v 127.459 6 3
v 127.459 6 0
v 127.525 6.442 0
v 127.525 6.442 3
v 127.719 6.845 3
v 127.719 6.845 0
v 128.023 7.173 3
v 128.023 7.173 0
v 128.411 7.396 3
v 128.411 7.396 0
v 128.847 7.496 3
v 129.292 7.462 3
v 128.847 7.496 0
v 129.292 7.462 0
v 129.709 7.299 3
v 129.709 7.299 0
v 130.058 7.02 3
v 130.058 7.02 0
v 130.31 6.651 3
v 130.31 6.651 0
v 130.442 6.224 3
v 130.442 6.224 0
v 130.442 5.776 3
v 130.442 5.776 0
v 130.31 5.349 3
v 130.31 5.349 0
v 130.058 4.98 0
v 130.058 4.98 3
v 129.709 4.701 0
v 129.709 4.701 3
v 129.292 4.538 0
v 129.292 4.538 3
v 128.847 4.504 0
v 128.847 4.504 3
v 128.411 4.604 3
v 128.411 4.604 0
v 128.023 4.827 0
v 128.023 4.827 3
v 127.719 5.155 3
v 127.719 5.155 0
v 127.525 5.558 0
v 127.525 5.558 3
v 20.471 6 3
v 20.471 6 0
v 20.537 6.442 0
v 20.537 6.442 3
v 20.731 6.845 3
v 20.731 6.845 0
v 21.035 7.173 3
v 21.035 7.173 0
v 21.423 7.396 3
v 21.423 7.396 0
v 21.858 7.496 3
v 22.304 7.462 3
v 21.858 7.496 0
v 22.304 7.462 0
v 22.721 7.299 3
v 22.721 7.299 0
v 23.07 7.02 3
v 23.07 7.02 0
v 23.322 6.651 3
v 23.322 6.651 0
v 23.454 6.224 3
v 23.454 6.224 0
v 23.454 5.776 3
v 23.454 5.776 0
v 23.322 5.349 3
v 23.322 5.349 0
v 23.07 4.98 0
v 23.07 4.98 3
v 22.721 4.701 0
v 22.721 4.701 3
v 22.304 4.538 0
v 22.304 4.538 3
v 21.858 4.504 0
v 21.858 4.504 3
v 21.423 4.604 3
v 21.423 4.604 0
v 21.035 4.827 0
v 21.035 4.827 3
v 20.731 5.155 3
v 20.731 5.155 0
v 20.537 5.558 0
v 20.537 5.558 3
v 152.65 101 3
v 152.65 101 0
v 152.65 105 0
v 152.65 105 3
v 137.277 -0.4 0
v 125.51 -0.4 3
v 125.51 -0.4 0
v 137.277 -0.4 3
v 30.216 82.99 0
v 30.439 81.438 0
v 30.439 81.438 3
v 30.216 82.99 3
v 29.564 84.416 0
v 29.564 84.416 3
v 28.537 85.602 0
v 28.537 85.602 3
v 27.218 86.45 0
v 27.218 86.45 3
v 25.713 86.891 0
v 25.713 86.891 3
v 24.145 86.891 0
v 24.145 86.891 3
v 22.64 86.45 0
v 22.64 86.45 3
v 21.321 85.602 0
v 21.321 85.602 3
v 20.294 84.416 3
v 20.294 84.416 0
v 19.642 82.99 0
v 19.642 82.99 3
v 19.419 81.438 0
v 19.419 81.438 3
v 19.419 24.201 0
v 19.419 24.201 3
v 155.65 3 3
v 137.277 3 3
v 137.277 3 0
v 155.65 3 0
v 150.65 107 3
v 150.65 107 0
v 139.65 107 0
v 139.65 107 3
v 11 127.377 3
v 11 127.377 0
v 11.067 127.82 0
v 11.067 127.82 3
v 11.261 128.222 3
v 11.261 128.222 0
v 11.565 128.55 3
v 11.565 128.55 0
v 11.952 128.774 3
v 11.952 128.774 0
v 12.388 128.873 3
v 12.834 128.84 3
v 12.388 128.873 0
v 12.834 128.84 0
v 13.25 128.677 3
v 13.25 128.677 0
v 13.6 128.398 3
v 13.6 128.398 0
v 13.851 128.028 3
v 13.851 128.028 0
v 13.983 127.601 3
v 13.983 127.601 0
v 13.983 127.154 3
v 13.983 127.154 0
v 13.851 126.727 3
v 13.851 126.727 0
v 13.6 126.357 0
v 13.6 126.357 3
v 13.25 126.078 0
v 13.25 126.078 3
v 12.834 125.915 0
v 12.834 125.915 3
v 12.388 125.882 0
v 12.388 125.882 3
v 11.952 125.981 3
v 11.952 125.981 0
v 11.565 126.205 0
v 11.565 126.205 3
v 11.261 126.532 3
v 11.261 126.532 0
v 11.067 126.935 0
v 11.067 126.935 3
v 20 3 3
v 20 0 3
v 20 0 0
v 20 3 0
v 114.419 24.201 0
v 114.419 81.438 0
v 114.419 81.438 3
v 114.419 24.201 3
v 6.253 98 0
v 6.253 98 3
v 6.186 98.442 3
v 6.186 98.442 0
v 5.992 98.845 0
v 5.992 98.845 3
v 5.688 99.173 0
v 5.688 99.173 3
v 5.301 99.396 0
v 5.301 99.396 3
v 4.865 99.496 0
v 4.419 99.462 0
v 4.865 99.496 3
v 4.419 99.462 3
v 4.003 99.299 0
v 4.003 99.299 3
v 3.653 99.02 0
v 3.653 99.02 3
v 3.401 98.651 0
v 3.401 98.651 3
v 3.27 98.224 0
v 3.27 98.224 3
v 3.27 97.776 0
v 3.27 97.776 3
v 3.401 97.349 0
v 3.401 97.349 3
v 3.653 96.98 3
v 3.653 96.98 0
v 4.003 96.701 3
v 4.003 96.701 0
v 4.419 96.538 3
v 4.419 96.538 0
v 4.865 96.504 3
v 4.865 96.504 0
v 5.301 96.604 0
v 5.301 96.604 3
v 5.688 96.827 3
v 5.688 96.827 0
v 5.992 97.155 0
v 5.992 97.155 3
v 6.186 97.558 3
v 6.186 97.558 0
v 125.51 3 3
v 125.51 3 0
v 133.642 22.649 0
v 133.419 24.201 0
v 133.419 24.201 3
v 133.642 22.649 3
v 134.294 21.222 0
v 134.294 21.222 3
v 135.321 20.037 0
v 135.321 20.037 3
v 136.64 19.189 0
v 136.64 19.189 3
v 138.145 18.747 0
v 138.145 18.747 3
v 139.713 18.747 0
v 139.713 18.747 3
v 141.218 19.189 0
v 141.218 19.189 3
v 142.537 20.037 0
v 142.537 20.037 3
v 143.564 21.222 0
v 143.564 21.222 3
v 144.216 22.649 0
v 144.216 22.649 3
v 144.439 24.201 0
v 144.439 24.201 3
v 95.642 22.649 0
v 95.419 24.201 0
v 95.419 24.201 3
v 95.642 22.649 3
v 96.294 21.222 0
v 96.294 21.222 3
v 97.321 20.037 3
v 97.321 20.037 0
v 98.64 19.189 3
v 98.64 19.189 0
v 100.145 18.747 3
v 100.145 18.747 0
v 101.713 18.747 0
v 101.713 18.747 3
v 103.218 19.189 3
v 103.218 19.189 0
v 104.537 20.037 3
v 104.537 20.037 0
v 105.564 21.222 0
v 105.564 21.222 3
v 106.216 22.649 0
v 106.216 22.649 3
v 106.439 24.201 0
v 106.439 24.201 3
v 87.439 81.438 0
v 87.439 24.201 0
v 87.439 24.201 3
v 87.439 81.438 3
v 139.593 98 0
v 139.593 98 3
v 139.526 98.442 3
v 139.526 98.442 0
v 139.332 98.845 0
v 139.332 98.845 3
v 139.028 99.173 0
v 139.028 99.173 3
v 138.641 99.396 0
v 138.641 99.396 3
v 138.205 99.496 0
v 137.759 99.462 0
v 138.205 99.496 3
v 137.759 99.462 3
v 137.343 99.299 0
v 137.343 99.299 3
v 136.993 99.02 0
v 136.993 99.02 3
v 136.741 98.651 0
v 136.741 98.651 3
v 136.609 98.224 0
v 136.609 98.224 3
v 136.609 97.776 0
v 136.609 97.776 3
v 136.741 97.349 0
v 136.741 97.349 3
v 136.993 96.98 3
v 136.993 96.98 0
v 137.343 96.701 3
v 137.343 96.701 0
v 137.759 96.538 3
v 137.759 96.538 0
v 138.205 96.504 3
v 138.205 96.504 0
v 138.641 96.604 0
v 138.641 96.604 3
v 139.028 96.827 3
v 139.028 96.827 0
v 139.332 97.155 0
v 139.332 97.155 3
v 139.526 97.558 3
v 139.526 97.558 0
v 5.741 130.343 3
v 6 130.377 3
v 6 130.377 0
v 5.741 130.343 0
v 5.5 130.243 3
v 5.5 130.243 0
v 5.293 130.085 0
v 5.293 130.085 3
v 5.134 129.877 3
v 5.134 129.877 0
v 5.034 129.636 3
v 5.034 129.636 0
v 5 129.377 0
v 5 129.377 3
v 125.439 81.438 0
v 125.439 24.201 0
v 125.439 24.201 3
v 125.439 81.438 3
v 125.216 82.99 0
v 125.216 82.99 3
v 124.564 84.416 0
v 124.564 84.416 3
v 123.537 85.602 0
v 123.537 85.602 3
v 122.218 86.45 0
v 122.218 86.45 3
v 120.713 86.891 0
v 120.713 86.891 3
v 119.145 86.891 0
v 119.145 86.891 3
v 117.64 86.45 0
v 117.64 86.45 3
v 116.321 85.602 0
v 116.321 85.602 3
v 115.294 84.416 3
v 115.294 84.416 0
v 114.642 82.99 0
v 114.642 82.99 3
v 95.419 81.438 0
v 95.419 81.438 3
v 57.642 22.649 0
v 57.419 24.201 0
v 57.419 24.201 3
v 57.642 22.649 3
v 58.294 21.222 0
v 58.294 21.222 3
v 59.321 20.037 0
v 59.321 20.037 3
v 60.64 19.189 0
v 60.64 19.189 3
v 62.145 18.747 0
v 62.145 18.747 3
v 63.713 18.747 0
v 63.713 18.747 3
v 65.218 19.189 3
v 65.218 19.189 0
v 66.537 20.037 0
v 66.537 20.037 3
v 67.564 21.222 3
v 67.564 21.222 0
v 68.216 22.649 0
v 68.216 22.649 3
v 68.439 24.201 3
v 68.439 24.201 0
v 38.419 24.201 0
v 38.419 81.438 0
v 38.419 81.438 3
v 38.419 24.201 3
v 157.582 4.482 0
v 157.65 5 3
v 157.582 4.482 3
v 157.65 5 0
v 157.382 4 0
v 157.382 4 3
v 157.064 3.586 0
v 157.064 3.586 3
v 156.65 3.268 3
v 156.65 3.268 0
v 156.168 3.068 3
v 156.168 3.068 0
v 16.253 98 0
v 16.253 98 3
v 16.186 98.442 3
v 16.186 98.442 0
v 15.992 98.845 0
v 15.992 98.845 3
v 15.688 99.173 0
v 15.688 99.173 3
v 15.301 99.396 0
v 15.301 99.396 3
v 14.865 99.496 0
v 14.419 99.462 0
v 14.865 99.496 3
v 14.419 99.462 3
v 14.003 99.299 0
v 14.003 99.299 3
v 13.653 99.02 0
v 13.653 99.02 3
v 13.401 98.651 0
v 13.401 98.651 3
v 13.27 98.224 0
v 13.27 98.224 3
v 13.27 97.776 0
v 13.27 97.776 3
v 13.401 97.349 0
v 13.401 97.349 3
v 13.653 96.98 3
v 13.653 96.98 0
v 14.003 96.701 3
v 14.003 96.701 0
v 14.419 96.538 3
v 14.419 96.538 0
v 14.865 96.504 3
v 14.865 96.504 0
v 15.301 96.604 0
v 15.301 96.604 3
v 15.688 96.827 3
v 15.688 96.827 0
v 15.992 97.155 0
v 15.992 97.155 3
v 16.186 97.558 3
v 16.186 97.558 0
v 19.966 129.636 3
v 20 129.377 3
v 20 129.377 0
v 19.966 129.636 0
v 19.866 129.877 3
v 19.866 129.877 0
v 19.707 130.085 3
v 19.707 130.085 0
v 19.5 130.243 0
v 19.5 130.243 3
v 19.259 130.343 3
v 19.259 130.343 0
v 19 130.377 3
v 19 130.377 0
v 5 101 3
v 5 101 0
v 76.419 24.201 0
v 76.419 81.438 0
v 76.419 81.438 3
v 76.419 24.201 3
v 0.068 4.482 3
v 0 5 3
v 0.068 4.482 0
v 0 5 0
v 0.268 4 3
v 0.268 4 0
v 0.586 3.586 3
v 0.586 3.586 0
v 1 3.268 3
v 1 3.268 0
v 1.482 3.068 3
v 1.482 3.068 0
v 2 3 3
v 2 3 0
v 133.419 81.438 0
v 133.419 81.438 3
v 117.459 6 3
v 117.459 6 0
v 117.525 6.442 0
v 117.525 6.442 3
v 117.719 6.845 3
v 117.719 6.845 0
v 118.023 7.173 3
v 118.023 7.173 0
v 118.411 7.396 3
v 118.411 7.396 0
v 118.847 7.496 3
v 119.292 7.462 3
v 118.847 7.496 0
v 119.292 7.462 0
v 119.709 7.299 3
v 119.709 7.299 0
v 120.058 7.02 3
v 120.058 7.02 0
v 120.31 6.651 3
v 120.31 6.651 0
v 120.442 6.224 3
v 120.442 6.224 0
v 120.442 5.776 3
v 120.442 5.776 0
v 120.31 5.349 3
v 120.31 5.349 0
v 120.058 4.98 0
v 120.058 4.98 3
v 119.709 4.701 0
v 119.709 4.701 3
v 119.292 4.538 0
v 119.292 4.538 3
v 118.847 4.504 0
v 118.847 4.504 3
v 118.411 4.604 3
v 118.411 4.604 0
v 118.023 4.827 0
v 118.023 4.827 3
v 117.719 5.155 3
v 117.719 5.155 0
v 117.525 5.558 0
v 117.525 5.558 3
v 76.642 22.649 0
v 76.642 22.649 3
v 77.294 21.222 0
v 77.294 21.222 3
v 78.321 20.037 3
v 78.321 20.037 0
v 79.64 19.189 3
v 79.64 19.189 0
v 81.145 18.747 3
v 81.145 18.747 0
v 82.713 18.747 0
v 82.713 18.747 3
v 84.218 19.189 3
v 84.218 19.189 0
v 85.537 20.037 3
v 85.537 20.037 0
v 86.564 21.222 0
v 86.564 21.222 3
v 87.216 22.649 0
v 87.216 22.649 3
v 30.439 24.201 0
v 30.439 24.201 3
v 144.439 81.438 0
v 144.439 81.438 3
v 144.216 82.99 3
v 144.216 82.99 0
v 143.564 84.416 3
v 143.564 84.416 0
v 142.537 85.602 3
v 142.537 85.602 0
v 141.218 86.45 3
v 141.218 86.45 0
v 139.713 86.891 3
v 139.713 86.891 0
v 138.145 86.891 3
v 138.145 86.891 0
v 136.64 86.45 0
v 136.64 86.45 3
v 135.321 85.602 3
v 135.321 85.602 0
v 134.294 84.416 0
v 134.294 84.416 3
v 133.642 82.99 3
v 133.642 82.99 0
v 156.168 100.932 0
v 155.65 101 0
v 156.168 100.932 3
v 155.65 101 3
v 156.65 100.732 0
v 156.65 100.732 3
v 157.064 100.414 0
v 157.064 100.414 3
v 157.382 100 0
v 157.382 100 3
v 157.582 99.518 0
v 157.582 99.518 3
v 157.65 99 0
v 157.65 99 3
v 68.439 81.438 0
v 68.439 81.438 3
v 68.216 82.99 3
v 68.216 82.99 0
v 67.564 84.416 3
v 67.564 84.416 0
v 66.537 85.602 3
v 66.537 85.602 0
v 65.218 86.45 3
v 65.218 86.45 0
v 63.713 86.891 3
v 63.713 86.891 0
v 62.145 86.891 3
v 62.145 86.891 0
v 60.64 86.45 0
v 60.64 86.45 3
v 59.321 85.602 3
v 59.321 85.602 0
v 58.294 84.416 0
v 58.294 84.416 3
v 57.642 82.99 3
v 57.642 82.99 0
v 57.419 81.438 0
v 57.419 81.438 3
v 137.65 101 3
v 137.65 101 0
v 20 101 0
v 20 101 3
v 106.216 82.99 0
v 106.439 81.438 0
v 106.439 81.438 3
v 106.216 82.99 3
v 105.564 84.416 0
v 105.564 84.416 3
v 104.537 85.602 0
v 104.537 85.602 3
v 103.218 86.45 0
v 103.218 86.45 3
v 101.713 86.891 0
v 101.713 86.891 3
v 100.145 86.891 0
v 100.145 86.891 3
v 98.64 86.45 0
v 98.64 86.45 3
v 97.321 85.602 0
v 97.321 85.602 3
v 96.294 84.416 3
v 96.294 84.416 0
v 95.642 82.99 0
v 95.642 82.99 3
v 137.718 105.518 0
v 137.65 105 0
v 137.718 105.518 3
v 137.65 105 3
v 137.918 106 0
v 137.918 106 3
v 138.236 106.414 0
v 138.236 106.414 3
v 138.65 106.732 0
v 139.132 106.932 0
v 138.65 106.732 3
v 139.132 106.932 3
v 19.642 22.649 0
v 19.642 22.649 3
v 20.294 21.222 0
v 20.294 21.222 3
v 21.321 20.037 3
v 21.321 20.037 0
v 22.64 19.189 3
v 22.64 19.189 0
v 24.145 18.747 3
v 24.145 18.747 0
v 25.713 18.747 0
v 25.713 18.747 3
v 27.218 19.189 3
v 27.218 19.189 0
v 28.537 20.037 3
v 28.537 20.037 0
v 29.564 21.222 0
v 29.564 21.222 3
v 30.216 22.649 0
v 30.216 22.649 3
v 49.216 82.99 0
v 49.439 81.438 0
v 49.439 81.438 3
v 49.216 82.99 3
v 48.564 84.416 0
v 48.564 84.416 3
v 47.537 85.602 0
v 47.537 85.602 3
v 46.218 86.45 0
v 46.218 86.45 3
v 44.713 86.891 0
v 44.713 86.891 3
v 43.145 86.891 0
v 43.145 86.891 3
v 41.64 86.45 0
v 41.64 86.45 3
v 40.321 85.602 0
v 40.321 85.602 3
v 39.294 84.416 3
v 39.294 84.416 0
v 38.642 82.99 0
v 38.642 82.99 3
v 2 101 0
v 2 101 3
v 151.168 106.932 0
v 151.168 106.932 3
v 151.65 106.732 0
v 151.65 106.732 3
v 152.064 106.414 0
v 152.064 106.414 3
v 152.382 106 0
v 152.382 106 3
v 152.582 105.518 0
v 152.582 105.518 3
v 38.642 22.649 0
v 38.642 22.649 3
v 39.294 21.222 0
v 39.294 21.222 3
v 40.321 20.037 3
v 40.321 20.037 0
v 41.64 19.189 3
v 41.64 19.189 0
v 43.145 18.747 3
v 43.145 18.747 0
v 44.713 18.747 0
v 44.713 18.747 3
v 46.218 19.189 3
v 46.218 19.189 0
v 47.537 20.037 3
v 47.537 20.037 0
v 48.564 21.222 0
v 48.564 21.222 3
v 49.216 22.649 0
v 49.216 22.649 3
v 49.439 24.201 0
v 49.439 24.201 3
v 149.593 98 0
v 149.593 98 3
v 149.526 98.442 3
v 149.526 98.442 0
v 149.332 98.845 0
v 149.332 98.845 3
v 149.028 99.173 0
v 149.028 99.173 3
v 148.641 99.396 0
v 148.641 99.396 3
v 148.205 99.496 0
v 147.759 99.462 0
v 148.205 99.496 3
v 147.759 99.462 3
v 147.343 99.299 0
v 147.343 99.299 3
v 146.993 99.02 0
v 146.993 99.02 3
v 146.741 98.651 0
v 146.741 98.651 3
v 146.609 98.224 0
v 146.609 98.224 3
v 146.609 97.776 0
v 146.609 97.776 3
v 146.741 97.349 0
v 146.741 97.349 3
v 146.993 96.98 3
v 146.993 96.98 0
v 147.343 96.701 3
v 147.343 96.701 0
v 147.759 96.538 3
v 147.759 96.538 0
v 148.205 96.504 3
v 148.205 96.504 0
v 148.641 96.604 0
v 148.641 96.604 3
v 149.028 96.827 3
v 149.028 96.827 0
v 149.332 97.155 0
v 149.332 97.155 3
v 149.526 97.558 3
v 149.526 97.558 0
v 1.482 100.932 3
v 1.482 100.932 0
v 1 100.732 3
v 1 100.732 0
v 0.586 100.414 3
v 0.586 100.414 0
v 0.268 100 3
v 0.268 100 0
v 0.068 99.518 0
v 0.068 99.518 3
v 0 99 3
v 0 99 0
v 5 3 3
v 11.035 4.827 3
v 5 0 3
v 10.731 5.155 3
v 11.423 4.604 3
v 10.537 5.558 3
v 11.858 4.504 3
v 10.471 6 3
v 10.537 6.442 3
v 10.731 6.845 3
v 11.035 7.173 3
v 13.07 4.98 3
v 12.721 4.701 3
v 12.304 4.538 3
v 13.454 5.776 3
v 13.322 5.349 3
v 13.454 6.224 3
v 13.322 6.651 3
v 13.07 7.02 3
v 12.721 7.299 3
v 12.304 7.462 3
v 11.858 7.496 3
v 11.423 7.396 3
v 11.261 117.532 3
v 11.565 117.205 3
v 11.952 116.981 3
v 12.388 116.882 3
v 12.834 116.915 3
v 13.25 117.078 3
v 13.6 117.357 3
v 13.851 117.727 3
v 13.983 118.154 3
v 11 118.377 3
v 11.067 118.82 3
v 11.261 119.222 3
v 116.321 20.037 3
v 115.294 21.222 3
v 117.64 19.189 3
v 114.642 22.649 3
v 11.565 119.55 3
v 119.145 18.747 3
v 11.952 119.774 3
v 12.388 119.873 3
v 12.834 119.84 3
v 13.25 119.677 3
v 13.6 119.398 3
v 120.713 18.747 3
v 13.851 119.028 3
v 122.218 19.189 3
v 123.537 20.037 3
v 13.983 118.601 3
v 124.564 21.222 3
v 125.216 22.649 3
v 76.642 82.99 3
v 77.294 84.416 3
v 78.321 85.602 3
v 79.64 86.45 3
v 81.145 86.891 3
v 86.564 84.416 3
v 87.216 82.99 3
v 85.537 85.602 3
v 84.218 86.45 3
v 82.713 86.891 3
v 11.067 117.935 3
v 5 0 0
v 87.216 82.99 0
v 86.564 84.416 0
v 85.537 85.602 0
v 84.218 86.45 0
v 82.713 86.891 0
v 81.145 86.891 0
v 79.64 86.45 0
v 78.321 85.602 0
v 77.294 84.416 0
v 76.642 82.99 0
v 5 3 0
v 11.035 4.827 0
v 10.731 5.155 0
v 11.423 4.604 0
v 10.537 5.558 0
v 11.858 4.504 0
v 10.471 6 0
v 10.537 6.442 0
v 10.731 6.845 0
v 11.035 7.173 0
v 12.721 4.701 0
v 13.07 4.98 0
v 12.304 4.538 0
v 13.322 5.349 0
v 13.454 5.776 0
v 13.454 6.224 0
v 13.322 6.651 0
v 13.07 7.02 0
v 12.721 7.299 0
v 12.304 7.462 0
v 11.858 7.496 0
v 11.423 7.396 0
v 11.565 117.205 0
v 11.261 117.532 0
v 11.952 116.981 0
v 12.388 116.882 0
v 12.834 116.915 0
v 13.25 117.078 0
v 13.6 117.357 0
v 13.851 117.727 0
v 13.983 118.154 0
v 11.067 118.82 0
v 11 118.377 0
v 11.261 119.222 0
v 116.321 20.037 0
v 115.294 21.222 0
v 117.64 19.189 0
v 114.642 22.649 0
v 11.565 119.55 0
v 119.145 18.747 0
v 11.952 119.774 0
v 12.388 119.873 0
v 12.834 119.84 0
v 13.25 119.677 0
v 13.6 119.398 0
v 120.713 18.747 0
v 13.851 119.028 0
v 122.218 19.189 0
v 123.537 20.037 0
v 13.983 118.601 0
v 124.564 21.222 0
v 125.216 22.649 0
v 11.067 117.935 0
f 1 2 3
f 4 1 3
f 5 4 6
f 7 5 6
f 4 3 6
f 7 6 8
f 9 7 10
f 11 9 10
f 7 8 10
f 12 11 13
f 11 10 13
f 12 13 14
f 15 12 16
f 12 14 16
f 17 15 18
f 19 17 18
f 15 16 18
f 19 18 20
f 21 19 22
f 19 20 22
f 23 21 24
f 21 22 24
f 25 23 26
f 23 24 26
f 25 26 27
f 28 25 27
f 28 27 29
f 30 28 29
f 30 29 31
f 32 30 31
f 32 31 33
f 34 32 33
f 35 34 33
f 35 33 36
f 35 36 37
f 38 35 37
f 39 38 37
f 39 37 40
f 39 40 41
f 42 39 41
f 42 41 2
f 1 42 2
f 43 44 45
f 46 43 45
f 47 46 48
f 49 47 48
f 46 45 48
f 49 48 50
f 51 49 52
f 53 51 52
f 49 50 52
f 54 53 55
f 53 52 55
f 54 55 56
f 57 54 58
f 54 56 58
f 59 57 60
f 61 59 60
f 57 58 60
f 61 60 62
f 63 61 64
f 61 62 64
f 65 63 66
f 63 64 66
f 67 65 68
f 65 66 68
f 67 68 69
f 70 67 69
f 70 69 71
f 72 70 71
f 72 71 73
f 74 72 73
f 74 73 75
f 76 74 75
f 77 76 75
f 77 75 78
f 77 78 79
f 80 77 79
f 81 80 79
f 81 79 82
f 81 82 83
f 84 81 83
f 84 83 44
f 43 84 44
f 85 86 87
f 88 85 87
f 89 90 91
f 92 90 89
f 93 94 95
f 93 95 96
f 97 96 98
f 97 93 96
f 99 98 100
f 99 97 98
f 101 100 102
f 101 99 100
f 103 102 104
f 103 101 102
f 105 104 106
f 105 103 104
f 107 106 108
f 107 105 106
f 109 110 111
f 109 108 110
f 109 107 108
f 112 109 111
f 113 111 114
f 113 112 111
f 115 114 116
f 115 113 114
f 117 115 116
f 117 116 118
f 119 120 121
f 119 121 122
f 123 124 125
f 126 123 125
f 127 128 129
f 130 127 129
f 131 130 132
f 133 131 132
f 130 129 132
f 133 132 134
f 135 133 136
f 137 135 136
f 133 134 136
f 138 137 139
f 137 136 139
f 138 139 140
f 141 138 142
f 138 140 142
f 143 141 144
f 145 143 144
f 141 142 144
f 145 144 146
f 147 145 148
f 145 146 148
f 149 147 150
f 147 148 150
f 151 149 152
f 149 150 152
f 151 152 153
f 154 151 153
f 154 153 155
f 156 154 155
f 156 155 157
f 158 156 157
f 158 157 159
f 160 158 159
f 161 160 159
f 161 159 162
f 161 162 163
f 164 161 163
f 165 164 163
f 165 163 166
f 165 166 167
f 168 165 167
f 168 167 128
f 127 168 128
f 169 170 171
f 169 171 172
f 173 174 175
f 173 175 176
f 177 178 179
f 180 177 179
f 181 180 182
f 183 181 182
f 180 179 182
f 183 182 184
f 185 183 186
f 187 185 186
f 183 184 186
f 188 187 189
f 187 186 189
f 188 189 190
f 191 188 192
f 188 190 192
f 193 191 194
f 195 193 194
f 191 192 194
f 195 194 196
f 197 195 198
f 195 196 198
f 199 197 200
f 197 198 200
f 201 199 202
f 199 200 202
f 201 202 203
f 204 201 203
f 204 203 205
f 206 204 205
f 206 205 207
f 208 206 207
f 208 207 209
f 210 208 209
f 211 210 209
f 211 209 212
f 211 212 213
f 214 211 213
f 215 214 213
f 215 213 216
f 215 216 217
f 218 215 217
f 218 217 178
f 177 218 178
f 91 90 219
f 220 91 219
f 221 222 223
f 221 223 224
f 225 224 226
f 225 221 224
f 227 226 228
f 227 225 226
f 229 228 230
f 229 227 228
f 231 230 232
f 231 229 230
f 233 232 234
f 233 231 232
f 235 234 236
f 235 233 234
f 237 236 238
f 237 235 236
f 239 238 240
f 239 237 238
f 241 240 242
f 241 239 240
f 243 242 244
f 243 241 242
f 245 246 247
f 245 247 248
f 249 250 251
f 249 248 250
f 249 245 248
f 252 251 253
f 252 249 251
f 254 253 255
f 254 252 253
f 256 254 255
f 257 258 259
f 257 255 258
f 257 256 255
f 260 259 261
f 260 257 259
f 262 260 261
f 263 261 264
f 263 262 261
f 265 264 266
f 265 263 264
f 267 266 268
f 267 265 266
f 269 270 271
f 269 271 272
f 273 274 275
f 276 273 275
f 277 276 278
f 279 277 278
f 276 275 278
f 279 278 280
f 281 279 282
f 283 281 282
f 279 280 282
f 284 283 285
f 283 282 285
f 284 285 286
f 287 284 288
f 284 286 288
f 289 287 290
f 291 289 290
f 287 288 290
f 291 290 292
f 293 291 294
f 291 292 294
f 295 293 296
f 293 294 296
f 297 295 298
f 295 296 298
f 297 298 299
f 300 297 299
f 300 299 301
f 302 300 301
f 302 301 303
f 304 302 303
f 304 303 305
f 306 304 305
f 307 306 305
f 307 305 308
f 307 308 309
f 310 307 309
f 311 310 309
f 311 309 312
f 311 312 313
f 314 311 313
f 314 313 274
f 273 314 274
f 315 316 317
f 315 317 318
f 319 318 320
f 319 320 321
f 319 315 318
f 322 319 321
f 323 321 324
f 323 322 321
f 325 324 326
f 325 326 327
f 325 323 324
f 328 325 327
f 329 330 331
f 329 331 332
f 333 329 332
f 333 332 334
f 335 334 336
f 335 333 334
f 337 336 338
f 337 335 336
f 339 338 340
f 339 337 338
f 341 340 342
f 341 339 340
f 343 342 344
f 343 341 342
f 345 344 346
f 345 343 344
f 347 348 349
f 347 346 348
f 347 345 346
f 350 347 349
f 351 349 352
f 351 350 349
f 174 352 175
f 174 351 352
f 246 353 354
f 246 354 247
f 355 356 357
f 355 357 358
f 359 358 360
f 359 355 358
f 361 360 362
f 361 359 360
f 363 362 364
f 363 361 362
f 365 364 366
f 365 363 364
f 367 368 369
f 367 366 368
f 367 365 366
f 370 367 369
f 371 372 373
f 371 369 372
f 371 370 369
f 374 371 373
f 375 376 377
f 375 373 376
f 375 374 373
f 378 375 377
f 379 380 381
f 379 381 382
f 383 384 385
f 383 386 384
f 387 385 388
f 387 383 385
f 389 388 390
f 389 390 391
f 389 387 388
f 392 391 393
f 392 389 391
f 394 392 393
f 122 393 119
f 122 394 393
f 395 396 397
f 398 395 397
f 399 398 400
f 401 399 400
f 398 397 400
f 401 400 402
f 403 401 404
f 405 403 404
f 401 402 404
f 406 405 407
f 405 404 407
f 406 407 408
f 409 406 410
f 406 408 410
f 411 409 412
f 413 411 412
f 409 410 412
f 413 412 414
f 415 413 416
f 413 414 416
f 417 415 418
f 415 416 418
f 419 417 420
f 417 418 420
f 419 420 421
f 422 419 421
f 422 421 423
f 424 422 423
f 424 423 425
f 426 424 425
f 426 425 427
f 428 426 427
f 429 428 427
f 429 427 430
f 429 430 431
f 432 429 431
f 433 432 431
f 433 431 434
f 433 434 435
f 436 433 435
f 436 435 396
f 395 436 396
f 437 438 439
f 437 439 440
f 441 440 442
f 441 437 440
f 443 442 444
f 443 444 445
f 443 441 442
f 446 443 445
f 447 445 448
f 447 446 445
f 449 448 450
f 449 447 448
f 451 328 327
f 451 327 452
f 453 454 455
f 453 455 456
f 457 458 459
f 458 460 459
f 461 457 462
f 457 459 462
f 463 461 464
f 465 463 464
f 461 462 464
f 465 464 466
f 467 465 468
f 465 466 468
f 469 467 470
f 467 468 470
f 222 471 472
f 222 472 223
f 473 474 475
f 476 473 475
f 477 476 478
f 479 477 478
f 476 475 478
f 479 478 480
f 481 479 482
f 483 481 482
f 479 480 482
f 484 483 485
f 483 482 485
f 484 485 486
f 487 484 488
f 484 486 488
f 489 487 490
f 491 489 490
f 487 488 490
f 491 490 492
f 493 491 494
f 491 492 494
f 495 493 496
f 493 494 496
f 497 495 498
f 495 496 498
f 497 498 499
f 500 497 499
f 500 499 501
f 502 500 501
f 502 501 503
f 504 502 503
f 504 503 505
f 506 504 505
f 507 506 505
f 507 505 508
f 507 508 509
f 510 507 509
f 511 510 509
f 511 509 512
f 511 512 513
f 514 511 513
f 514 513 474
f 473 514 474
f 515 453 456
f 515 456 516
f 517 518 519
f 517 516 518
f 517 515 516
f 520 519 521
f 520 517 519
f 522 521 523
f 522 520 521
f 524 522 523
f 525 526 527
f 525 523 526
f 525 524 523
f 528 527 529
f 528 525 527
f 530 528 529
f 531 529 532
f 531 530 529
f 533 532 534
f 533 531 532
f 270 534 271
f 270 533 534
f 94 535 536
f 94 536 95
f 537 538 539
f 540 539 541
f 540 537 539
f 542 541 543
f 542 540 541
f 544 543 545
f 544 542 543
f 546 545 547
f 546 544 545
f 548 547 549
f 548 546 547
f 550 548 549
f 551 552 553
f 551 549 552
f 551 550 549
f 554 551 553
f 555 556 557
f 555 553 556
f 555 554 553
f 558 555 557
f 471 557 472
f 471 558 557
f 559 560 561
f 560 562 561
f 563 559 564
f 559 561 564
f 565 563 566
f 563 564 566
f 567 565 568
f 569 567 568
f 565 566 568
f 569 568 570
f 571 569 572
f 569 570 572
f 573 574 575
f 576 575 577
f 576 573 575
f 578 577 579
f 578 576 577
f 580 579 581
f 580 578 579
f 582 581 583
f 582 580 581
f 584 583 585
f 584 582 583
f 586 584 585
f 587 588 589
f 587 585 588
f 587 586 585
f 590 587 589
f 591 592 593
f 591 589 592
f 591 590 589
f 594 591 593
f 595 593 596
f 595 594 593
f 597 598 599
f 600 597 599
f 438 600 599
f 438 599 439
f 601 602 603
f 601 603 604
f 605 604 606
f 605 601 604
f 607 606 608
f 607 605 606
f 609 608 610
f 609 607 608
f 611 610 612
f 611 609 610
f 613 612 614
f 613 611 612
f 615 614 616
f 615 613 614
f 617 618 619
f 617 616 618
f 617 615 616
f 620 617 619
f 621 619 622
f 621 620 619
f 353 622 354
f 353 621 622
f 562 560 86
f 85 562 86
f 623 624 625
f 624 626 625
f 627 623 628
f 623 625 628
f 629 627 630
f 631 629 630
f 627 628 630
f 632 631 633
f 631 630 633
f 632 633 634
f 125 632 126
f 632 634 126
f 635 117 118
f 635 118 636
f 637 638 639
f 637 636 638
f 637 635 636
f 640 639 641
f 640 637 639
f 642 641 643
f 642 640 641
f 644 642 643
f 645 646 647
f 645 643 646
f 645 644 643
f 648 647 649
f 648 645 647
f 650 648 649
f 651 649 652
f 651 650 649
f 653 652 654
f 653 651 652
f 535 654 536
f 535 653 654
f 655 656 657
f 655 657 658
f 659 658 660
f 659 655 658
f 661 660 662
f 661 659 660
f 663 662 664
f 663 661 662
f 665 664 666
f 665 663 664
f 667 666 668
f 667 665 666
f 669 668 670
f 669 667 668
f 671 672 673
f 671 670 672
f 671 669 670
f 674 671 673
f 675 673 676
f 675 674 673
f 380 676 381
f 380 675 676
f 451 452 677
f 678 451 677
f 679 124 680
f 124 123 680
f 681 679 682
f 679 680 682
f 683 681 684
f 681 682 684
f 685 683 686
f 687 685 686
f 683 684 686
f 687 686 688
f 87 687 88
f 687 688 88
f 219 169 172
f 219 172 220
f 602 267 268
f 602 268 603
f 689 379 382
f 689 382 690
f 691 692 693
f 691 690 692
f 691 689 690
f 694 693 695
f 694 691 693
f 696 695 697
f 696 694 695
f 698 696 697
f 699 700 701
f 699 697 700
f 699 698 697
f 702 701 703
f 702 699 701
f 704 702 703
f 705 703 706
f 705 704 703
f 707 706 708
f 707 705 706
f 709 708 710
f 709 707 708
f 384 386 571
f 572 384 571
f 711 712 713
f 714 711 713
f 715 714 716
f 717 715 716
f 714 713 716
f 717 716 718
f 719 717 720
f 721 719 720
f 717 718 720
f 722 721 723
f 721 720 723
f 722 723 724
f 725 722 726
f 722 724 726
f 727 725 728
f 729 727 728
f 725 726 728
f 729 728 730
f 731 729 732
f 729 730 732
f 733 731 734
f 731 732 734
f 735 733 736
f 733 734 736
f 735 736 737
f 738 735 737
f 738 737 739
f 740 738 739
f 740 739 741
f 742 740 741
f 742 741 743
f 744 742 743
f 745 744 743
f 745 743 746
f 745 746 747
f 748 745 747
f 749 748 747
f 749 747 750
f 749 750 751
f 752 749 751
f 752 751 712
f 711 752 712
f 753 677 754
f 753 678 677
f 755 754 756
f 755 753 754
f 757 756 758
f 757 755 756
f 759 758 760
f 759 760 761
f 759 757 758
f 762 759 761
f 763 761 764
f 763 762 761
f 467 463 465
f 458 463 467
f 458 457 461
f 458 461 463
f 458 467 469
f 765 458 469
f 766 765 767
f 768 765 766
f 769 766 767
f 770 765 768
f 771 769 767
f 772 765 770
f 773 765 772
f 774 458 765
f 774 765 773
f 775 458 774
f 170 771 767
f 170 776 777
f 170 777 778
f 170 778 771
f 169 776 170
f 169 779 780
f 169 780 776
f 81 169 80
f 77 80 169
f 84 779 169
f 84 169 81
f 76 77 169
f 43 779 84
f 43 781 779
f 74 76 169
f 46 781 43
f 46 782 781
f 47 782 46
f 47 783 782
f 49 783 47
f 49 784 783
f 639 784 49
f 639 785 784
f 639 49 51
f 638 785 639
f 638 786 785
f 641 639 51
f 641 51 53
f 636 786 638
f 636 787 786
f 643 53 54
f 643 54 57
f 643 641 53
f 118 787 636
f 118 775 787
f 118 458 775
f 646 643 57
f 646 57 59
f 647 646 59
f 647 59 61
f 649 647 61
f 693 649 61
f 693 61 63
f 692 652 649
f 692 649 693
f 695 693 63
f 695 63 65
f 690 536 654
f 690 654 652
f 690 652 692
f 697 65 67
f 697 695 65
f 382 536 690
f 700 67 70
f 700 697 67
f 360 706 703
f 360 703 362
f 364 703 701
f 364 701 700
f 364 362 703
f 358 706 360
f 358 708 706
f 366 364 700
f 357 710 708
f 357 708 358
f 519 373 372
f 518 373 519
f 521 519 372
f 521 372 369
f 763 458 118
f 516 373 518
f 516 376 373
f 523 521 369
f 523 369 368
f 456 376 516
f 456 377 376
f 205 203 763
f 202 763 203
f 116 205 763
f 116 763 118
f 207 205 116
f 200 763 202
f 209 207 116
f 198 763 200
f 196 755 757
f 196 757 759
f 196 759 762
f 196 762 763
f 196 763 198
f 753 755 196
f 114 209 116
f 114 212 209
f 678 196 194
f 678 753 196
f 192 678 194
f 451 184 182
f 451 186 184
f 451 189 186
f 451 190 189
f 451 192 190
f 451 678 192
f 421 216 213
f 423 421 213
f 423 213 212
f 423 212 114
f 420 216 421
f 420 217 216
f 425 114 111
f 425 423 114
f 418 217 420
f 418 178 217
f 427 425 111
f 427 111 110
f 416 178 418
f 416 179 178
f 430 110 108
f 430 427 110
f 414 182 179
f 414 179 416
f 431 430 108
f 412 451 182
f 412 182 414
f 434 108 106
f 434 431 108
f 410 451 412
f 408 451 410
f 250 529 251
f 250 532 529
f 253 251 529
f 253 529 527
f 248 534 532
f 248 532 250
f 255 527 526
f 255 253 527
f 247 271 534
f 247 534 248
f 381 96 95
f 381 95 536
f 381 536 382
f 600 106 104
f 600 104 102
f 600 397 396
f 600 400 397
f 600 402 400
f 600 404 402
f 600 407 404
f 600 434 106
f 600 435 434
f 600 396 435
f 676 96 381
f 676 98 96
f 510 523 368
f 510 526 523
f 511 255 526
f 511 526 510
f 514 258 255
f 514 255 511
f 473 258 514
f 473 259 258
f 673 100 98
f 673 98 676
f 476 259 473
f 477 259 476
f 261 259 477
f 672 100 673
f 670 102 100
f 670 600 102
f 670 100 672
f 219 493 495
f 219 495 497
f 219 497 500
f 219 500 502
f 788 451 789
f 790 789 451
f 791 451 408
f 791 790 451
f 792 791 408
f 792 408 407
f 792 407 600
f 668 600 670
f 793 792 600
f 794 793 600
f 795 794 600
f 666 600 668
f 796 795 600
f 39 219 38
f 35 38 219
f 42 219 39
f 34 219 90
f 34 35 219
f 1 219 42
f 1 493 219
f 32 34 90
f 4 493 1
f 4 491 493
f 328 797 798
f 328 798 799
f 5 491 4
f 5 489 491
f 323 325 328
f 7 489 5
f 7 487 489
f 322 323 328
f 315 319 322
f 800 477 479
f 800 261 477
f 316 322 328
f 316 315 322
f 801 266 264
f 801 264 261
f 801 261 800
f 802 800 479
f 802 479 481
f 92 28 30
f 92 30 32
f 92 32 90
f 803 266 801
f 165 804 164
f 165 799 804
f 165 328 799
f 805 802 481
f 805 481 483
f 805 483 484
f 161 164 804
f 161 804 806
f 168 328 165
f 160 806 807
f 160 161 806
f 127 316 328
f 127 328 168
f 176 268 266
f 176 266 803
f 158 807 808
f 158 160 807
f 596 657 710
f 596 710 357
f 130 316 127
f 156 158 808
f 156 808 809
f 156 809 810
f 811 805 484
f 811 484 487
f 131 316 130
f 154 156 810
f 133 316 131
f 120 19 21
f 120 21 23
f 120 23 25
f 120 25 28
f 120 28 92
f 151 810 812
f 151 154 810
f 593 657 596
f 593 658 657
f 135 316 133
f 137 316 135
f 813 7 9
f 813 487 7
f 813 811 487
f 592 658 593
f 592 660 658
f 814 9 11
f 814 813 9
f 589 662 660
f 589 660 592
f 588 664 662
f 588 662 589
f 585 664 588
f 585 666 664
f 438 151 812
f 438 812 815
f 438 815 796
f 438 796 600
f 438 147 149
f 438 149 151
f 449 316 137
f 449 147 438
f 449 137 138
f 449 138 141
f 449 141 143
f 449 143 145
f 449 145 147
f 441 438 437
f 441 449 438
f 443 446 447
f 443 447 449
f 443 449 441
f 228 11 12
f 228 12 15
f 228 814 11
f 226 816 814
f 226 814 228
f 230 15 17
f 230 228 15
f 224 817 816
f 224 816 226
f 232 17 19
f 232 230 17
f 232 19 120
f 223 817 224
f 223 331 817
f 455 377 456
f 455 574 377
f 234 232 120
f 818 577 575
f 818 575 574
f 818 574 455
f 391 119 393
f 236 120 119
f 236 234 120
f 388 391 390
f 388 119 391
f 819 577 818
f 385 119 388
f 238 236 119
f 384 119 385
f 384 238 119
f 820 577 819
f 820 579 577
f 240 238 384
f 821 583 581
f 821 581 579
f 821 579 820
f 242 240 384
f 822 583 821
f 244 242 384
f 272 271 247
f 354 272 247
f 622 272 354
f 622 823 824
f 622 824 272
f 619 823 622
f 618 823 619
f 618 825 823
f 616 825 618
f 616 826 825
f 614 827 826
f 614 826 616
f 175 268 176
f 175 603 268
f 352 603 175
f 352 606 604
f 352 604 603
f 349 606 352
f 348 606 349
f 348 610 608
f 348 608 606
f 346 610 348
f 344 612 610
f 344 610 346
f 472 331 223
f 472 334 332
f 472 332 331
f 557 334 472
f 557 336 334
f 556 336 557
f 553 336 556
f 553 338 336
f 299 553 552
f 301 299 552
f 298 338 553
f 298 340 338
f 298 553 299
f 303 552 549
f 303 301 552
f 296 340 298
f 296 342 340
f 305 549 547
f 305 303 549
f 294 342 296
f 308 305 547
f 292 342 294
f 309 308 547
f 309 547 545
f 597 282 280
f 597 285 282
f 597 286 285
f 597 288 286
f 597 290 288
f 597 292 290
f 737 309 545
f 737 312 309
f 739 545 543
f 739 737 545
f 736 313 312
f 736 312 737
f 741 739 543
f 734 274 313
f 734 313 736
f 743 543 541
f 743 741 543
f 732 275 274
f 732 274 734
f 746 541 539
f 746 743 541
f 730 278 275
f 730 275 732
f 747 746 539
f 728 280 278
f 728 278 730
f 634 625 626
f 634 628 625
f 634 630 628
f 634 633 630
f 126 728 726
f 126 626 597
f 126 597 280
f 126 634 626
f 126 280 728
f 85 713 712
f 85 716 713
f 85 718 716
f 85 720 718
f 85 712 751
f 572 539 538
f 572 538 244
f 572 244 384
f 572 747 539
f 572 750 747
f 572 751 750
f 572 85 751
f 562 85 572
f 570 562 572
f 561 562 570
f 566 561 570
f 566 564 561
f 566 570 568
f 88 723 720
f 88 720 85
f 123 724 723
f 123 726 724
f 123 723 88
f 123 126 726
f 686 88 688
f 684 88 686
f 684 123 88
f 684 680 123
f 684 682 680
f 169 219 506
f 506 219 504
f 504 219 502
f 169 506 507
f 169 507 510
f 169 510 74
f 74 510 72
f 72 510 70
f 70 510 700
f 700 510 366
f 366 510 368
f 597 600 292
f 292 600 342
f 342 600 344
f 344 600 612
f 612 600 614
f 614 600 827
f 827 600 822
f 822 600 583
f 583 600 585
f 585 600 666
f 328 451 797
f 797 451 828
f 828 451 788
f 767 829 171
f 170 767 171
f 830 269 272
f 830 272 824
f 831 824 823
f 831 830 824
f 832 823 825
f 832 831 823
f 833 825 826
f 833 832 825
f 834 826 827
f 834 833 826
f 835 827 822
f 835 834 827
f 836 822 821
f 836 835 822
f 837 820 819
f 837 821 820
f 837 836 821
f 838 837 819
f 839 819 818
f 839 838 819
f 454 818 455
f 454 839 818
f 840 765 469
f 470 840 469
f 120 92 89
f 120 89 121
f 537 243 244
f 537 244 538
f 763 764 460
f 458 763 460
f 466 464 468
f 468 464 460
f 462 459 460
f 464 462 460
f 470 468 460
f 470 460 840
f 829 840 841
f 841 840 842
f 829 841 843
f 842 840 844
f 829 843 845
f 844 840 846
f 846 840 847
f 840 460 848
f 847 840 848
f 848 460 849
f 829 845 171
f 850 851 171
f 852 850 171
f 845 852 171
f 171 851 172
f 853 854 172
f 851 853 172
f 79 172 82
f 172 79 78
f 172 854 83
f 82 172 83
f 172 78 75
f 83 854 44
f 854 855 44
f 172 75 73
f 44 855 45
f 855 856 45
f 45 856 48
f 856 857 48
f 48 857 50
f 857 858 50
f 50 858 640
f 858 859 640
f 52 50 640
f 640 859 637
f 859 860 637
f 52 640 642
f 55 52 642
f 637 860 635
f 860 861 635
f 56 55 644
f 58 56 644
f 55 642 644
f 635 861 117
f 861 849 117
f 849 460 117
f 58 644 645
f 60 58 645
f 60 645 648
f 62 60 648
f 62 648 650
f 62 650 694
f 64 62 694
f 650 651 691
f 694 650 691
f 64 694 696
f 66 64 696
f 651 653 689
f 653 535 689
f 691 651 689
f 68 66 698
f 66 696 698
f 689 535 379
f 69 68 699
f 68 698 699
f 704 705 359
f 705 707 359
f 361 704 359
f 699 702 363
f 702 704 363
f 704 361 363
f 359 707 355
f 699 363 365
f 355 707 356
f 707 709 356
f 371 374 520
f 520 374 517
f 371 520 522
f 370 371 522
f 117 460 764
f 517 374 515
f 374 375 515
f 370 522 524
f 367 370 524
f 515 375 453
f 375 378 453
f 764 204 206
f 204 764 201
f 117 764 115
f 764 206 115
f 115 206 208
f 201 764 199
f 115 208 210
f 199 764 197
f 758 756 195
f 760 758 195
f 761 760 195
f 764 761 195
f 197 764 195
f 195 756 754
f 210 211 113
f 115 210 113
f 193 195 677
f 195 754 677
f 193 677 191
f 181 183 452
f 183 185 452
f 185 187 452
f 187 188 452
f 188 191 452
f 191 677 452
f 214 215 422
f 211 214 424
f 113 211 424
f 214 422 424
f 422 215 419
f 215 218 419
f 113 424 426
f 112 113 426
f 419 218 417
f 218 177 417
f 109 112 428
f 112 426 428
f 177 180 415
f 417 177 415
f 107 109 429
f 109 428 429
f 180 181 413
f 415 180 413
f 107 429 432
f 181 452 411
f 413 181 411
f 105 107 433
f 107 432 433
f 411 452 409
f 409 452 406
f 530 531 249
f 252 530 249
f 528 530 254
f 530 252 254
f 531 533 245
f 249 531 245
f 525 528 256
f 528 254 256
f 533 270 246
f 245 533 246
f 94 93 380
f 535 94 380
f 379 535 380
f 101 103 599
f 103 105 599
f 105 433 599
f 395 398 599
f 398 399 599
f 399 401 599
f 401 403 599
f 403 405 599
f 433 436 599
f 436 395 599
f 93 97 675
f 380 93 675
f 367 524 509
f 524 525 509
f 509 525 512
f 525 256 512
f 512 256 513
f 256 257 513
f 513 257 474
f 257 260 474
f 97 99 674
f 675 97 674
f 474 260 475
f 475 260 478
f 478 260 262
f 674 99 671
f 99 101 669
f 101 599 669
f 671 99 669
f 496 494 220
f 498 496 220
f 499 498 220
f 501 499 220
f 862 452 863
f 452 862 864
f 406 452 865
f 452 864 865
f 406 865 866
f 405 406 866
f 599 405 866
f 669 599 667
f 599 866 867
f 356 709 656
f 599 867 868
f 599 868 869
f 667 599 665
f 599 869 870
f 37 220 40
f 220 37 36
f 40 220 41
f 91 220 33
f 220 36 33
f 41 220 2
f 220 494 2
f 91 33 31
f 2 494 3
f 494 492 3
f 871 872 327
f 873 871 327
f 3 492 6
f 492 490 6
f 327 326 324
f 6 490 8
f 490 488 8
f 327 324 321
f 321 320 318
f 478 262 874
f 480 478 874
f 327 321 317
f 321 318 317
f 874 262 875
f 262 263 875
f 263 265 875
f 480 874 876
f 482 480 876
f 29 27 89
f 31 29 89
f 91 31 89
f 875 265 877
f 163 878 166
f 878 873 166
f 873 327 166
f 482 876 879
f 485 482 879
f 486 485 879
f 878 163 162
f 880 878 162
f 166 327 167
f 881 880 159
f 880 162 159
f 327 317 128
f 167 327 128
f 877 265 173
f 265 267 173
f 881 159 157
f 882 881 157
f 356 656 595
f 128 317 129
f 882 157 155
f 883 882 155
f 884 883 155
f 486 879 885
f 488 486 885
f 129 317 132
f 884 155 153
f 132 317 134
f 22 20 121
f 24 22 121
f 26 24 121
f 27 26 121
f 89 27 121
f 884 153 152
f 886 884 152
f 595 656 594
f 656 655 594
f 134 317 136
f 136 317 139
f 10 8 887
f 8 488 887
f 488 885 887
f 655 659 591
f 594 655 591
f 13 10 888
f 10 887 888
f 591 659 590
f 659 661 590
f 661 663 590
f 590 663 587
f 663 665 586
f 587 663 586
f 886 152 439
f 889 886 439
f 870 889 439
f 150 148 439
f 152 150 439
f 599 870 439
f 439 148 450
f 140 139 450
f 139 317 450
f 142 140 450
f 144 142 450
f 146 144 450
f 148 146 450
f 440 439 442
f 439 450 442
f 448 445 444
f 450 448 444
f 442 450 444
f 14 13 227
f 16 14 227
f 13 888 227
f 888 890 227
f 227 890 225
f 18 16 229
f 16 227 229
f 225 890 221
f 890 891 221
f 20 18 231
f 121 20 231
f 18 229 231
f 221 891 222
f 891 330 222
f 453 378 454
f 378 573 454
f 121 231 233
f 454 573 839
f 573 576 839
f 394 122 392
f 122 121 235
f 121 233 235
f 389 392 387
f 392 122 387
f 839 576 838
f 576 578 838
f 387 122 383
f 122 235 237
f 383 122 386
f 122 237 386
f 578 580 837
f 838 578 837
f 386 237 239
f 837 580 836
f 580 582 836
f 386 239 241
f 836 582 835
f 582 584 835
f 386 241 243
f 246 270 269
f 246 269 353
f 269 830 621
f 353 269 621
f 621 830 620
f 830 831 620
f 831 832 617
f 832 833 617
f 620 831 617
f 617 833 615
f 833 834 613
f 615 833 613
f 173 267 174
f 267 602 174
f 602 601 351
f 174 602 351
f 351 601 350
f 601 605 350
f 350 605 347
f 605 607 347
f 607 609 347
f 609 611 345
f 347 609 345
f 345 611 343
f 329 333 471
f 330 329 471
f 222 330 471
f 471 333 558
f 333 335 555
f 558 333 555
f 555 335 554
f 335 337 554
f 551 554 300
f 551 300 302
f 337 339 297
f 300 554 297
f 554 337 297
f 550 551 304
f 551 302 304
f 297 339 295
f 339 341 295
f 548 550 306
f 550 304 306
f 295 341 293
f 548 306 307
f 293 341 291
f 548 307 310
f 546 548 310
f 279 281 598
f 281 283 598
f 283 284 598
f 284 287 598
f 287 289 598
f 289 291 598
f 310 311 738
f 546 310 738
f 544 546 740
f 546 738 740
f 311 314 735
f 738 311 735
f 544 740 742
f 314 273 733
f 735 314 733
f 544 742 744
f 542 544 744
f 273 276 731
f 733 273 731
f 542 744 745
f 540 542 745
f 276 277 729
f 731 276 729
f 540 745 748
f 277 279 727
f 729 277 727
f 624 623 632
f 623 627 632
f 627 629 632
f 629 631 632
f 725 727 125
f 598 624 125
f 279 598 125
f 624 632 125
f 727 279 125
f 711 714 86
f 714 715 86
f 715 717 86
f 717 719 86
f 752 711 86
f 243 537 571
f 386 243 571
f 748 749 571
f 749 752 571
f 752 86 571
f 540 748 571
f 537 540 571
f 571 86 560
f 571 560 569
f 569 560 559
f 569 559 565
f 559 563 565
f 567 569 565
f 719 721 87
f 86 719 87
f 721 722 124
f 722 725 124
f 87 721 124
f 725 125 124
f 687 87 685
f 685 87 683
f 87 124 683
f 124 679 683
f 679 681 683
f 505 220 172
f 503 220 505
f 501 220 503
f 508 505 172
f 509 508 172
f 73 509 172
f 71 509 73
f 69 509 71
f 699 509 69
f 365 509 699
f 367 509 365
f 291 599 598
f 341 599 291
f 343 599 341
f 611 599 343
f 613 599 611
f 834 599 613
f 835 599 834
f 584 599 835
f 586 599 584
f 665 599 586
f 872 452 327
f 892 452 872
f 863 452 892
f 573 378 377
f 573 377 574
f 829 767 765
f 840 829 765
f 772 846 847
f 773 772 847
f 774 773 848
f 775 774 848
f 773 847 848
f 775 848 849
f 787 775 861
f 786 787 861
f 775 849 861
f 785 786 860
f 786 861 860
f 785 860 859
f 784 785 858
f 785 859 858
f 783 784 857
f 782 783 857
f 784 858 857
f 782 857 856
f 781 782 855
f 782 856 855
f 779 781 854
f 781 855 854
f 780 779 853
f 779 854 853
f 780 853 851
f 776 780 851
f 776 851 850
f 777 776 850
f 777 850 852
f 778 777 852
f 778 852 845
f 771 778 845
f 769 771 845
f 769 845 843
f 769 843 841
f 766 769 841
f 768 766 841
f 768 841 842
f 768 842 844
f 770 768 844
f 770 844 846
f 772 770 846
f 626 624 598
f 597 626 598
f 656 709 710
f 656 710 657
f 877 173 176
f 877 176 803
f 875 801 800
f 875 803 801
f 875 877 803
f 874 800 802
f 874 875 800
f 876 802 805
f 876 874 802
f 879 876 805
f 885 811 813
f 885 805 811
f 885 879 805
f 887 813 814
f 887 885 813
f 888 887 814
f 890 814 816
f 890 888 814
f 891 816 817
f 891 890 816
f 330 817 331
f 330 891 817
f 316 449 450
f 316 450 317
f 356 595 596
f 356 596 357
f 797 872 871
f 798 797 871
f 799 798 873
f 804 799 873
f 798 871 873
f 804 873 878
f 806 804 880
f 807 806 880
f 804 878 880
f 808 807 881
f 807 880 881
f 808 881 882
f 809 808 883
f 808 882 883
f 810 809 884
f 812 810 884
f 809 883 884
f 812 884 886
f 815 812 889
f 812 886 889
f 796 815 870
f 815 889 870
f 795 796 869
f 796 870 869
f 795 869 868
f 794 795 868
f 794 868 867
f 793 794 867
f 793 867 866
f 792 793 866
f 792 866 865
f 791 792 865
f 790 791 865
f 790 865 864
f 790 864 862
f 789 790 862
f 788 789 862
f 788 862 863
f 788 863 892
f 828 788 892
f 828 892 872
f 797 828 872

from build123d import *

# Parameters (mm, degrees)
EXTRUDE_1_DEPTH      = 3
SKETCH_2_W           = 15
SKETCH_2_H           = 3
EXTRUDE_2_DEPTH      = 0.5
FILLET_4_R           = 0.5
SKETCH_6_W           = 118.474287265
SKETCH_6_H           = 3
CUT_EXTRUDE_3_DEPTH  = 10
SKETCH_10_R          = 1.5
CUT_EXTRUDE_7_DEPTH  = 191.555825154
SKETCH_11_R          = 1.5
CUT_EXTRUDE_8_DEPTH  = 191.555825154
SKETCH_15_W          = 15
SKETCH_15_H          = 9
EXTRUDE_4_DEPTH      = 3
FILLET_7_R           = 1
SKETCH_16_R          = 1.5
CUT_EXTRUDE_9_DEPTH  = 194.047828552
EXTRUDE_5_DEPTH      = 3
CUT_EXTRUDE_10_DEPTH = 10
FILLET_8_R           = 2
SKETCH_19_W          = 19.175712735
SKETCH_19_H          = 3
CUT_EXTRUDE_11_DEPTH = 10
FILLET_9_R           = 2
SKETCH_20_W          = 11.767330379
SKETCH_20_H          = 3.399854124
EXTRUDE_6_DEPTH      = 3
SKETCH_21_R          = 1.5
CUT_EXTRUDE_12_DEPTH = 10
SKETCH_23_R          = 1.5
CUT_EXTRUDE_13_DEPTH = 10


with BuildPart() as part:
    # 草图1 → 凸台-拉伸1 (new body)
    with BuildSketch(Plane.XY):
        Polygon((0, 101), (0, 0), (157.65, 0), (157.65, 101), (152.65, 101), (152.65, 107), (137.65, 107), (137.65, 101), (20, 101), (20, 104), (5, 104), (5, 101), align=None)
    extrude(amount=EXTRUDE_1_DEPTH)

    # 草图2 → 凸台-拉伸2 (add)
    with BuildSketch(Plane(origin=(0, 104, 0), x_dir=(1, 0, 0), z_dir=(0, 1, 0))):
        with Locations((12.5, -1.5)):
            Rectangle(SKETCH_2_W, SKETCH_2_H)
    extrude(amount=EXTRUDE_2_DEPTH)

    # 圆角4
    fillet_4_edges = [part.edges().sort_by_distance(p)[0] for p in [
        (0, 0, 1.5),
    ]]
    fillet(fillet_4_edges, radius=FILLET_4_R)

    # 草图6 → 切除-拉伸3 (cut)
    with BuildSketch(Plane.XY.offset(3)):
        with BuildLine():
            Line((5, 3), (0, 3))
            Line((0, 3), (0, 0.5))
            ThreePointArc((0, 0.5), (0.146446609, 0.146446609), (0.5, 0))
            Line((0.5, 0), (5, 0))
            Line((5, 0), (5, 3))
        make_face()
        with Locations((79.237143633, 1.5)):
            Rectangle(SKETCH_6_W, SKETCH_6_H)
    extrude(amount=-CUT_EXTRUDE_3_DEPTH, mode=Mode.SUBTRACT)

    # 草图10 → 切除-拉伸7 (cut, through all)
    with BuildSketch(Plane(origin=(0, 0, 0), x_dir=(-1, 0, 0), z_dir=(0, 0, -1))):
        with Locations((-21.970523915, 6)):
            Circle(SKETCH_10_R)
        with Locations((-11.970523915, 6)):
            Circle(SKETCH_10_R)
    extrude(amount=-CUT_EXTRUDE_7_DEPTH, mode=Mode.SUBTRACT)

    # 草图11 → 切除-拉伸8 (cut, through all)
    with BuildSketch(Plane(origin=(0, 0, 0), x_dir=(-1, 0, 0), z_dir=(0, 0, -1))):
        with Locations((-128.958696033, 6)):
            Circle(SKETCH_11_R)
        with Locations((-118.958696033, 6)):
            Circle(SKETCH_11_R)
    extrude(amount=-CUT_EXTRUDE_8_DEPTH, mode=Mode.SUBTRACT)

    # 草图15 → 凸台-拉伸4 (add)
    with BuildSketch(Plane(origin=(0, 0, 0), x_dir=(-1, 0, 0), z_dir=(0, 0, -1))):
        with Locations((-12.5, 106.877473525)):
            Rectangle(SKETCH_15_W, SKETCH_15_H)
    extrude(amount=-EXTRUDE_4_DEPTH)

    # 圆角7
    fillet_7_edges = [part.edges().sort_by_distance(p)[0] for p in [
        (5, 111.377473525, 1.5),
        (20, 111.377473525, 1.5),
    ]]
    fillet(fillet_7_edges, radius=FILLET_7_R)

    # 草图16 → 切除-拉伸9 (cut, through all)
    with BuildSketch(Plane.XY.offset(3)):
        with Locations((4.752930025, 98)):
            Circle(SKETCH_16_R)
        with Locations((14.752930025, 98)):
            Circle(SKETCH_16_R)
    extrude(amount=-CUT_EXTRUDE_9_DEPTH, mode=Mode.SUBTRACT)

    # 草图17 → 凸台-拉伸5 (add)
    with BuildSketch(Plane.XY.offset(3)):
        with BuildLine():
            Line((19, 130.377473525), (6, 130.377473525))
            ThreePointArc((6, 130.377473525), (5.292893219, 130.084580306), (5, 129.377473525))
            Line((5, 129.377473525), (5, 110.377473525))
            Line((5, 110.377473525), (20, 110.377473525))
            Line((20, 110.377473525), (20, 129.377473525))
            ThreePointArc((20, 129.377473525), (19.707106781, 130.084580306), (19, 130.377473525))
        make_face()
    extrude(amount=-EXTRUDE_5_DEPTH)

    # 草图18 → 切除-拉伸10 (cut)
    with BuildSketch(Plane(origin=(0, 0, 0), x_dir=(-1, 0, 0), z_dir=(0, 0, -1))):
        with BuildLine():
            Line((-133.418834054, 81.437570997), (-133.418834054, 24.201192967))
            ThreePointArc((-133.418834054, 24.201192967), (-138.928819365, 18.691207656), (-144.438804677, 24.201192967))
            Line((-144.438804677, 24.201192967), (-144.438804677, 81.437570997))
            ThreePointArc((-144.438804677, 81.437570997), (-138.928819365, 86.947556308), (-133.418834054, 81.437570997))
        make_face()
        with BuildLine():
            Line((-114.418834054, 81.437570997), (-114.418834054, 24.201192967))
            ThreePointArc((-114.418834054, 24.201192967), (-119.928819365, 18.691207656), (-125.438804677, 24.201192967))
            Line((-125.438804677, 24.201192967), (-125.438804677, 81.437570997))
            ThreePointArc((-125.438804677, 81.437570997), (-119.928819365, 86.947556308), (-114.418834054, 81.437570997))
        make_face()
        with BuildLine():
            Line((-95.418834054, 81.437570997), (-95.418834054, 24.201192967))
            ThreePointArc((-95.418834054, 24.201192967), (-100.928819365, 18.691207656), (-106.438804677, 24.201192967))
            Line((-106.438804677, 24.201192967), (-106.438804677, 81.437570997))
            ThreePointArc((-106.438804677, 81.437570997), (-100.928819365, 86.947556308), (-95.418834054, 81.437570997))
        make_face()
        with BuildLine():
            Line((-76.418834054, 81.437570997), (-76.418834054, 24.201192967))
            ThreePointArc((-76.418834054, 24.201192967), (-81.928819365, 18.691207656), (-87.438804677, 24.201192967))
            Line((-87.438804677, 24.201192967), (-87.438804677, 81.437570997))
            ThreePointArc((-87.438804677, 81.437570997), (-81.928819365, 86.947556308), (-76.418834054, 81.437570997))
        make_face()
        with BuildLine():
            Line((-57.418834054, 81.437570997), (-57.418834054, 24.201192967))
            ThreePointArc((-57.418834054, 24.201192967), (-62.928819365, 18.691207656), (-68.438804677, 24.201192967))
            Line((-68.438804677, 24.201192967), (-68.438804677, 81.437570997))
            ThreePointArc((-68.438804677, 81.437570997), (-62.928819365, 86.947556308), (-57.418834054, 81.437570997))
        make_face()
        with BuildLine():
            Line((-38.418834054, 81.437570997), (-38.418834054, 24.201192967))
            ThreePointArc((-38.418834054, 24.201192967), (-43.928819365, 18.691207656), (-49.438804677, 24.201192967))
            Line((-49.438804677, 24.201192967), (-49.438804677, 81.437570997))
            ThreePointArc((-49.438804677, 81.437570997), (-43.928819365, 86.947556308), (-38.418834054, 81.437570997))
        make_face()
        with BuildLine():
            Line((-19.418834054, 81.437570997), (-19.418834054, 24.201192967))
            ThreePointArc((-19.418834054, 24.201192967), (-24.928819365, 18.691207656), (-30.438804677, 24.201192967))
            Line((-30.438804677, 24.201192967), (-30.438804677, 81.437570997))
            ThreePointArc((-30.438804677, 81.437570997), (-24.928819365, 86.947556308), (-19.418834054, 81.437570997))
        make_face()
    extrude(amount=-CUT_EXTRUDE_10_DEPTH, mode=Mode.SUBTRACT)

    # 圆角8
    fillet_8_edges = [part.edges().sort_by_distance(p)[0] for p in [
        (157.65, 101, 1.5),
        (0, 101, 1.5),
        (137.65, 107, 1.5),
        (152.65, 107, 1.5),
        (0, 3, 1.5),
    ]]
    fillet(fillet_8_edges, radius=FILLET_8_R)

    # 草图19 → 切除-拉伸11 (cut)
    with BuildSketch(Plane.XY.offset(3)):
        with Locations((148.062143633, 1.5)):
            Rectangle(SKETCH_19_W, SKETCH_19_H)
    extrude(amount=-CUT_EXTRUDE_11_DEPTH, mode=Mode.SUBTRACT)

    # 圆角9
    fillet_9_edges = [part.edges().sort_by_distance(p)[0] for p in [
        (157.65, 3, 1.5),
    ]]
    fillet(fillet_9_edges, radius=FILLET_9_R)

    # 草图20 → 凸台-拉伸6 (add)
    with BuildSketch(Plane.XY.offset(3)):
        with Locations((131.393642897, 1.300072938)):
            Rectangle(SKETCH_20_W, SKETCH_20_H)
    extrude(amount=-EXTRUDE_6_DEPTH)

    # 草图21 → 切除-拉伸12 (cut)
    with BuildSketch(Plane(origin=(0, 0, 0), x_dir=(-1, 0, 0), z_dir=(0, 0, -1))):
        with Locations((-12.5, 127.377473525)):
            Circle(SKETCH_21_R)
        with Locations((-12.5, 118.377473525)):
            Circle(SKETCH_21_R)
    extrude(amount=-CUT_EXTRUDE_12_DEPTH, mode=Mode.SUBTRACT)

    # 草图23 → 切除-拉伸13 (cut)
    with BuildSketch(Plane.XY.offset(3)):
        with Locations((148.09274498, 98)):
            Circle(SKETCH_23_R)
        with Locations((138.09274498, 98)):
            Circle(SKETCH_23_R)
    extrude(amount=-CUT_EXTRUDE_13_DEPTH, mode=Mode.SUBTRACT)


solid = part.part
